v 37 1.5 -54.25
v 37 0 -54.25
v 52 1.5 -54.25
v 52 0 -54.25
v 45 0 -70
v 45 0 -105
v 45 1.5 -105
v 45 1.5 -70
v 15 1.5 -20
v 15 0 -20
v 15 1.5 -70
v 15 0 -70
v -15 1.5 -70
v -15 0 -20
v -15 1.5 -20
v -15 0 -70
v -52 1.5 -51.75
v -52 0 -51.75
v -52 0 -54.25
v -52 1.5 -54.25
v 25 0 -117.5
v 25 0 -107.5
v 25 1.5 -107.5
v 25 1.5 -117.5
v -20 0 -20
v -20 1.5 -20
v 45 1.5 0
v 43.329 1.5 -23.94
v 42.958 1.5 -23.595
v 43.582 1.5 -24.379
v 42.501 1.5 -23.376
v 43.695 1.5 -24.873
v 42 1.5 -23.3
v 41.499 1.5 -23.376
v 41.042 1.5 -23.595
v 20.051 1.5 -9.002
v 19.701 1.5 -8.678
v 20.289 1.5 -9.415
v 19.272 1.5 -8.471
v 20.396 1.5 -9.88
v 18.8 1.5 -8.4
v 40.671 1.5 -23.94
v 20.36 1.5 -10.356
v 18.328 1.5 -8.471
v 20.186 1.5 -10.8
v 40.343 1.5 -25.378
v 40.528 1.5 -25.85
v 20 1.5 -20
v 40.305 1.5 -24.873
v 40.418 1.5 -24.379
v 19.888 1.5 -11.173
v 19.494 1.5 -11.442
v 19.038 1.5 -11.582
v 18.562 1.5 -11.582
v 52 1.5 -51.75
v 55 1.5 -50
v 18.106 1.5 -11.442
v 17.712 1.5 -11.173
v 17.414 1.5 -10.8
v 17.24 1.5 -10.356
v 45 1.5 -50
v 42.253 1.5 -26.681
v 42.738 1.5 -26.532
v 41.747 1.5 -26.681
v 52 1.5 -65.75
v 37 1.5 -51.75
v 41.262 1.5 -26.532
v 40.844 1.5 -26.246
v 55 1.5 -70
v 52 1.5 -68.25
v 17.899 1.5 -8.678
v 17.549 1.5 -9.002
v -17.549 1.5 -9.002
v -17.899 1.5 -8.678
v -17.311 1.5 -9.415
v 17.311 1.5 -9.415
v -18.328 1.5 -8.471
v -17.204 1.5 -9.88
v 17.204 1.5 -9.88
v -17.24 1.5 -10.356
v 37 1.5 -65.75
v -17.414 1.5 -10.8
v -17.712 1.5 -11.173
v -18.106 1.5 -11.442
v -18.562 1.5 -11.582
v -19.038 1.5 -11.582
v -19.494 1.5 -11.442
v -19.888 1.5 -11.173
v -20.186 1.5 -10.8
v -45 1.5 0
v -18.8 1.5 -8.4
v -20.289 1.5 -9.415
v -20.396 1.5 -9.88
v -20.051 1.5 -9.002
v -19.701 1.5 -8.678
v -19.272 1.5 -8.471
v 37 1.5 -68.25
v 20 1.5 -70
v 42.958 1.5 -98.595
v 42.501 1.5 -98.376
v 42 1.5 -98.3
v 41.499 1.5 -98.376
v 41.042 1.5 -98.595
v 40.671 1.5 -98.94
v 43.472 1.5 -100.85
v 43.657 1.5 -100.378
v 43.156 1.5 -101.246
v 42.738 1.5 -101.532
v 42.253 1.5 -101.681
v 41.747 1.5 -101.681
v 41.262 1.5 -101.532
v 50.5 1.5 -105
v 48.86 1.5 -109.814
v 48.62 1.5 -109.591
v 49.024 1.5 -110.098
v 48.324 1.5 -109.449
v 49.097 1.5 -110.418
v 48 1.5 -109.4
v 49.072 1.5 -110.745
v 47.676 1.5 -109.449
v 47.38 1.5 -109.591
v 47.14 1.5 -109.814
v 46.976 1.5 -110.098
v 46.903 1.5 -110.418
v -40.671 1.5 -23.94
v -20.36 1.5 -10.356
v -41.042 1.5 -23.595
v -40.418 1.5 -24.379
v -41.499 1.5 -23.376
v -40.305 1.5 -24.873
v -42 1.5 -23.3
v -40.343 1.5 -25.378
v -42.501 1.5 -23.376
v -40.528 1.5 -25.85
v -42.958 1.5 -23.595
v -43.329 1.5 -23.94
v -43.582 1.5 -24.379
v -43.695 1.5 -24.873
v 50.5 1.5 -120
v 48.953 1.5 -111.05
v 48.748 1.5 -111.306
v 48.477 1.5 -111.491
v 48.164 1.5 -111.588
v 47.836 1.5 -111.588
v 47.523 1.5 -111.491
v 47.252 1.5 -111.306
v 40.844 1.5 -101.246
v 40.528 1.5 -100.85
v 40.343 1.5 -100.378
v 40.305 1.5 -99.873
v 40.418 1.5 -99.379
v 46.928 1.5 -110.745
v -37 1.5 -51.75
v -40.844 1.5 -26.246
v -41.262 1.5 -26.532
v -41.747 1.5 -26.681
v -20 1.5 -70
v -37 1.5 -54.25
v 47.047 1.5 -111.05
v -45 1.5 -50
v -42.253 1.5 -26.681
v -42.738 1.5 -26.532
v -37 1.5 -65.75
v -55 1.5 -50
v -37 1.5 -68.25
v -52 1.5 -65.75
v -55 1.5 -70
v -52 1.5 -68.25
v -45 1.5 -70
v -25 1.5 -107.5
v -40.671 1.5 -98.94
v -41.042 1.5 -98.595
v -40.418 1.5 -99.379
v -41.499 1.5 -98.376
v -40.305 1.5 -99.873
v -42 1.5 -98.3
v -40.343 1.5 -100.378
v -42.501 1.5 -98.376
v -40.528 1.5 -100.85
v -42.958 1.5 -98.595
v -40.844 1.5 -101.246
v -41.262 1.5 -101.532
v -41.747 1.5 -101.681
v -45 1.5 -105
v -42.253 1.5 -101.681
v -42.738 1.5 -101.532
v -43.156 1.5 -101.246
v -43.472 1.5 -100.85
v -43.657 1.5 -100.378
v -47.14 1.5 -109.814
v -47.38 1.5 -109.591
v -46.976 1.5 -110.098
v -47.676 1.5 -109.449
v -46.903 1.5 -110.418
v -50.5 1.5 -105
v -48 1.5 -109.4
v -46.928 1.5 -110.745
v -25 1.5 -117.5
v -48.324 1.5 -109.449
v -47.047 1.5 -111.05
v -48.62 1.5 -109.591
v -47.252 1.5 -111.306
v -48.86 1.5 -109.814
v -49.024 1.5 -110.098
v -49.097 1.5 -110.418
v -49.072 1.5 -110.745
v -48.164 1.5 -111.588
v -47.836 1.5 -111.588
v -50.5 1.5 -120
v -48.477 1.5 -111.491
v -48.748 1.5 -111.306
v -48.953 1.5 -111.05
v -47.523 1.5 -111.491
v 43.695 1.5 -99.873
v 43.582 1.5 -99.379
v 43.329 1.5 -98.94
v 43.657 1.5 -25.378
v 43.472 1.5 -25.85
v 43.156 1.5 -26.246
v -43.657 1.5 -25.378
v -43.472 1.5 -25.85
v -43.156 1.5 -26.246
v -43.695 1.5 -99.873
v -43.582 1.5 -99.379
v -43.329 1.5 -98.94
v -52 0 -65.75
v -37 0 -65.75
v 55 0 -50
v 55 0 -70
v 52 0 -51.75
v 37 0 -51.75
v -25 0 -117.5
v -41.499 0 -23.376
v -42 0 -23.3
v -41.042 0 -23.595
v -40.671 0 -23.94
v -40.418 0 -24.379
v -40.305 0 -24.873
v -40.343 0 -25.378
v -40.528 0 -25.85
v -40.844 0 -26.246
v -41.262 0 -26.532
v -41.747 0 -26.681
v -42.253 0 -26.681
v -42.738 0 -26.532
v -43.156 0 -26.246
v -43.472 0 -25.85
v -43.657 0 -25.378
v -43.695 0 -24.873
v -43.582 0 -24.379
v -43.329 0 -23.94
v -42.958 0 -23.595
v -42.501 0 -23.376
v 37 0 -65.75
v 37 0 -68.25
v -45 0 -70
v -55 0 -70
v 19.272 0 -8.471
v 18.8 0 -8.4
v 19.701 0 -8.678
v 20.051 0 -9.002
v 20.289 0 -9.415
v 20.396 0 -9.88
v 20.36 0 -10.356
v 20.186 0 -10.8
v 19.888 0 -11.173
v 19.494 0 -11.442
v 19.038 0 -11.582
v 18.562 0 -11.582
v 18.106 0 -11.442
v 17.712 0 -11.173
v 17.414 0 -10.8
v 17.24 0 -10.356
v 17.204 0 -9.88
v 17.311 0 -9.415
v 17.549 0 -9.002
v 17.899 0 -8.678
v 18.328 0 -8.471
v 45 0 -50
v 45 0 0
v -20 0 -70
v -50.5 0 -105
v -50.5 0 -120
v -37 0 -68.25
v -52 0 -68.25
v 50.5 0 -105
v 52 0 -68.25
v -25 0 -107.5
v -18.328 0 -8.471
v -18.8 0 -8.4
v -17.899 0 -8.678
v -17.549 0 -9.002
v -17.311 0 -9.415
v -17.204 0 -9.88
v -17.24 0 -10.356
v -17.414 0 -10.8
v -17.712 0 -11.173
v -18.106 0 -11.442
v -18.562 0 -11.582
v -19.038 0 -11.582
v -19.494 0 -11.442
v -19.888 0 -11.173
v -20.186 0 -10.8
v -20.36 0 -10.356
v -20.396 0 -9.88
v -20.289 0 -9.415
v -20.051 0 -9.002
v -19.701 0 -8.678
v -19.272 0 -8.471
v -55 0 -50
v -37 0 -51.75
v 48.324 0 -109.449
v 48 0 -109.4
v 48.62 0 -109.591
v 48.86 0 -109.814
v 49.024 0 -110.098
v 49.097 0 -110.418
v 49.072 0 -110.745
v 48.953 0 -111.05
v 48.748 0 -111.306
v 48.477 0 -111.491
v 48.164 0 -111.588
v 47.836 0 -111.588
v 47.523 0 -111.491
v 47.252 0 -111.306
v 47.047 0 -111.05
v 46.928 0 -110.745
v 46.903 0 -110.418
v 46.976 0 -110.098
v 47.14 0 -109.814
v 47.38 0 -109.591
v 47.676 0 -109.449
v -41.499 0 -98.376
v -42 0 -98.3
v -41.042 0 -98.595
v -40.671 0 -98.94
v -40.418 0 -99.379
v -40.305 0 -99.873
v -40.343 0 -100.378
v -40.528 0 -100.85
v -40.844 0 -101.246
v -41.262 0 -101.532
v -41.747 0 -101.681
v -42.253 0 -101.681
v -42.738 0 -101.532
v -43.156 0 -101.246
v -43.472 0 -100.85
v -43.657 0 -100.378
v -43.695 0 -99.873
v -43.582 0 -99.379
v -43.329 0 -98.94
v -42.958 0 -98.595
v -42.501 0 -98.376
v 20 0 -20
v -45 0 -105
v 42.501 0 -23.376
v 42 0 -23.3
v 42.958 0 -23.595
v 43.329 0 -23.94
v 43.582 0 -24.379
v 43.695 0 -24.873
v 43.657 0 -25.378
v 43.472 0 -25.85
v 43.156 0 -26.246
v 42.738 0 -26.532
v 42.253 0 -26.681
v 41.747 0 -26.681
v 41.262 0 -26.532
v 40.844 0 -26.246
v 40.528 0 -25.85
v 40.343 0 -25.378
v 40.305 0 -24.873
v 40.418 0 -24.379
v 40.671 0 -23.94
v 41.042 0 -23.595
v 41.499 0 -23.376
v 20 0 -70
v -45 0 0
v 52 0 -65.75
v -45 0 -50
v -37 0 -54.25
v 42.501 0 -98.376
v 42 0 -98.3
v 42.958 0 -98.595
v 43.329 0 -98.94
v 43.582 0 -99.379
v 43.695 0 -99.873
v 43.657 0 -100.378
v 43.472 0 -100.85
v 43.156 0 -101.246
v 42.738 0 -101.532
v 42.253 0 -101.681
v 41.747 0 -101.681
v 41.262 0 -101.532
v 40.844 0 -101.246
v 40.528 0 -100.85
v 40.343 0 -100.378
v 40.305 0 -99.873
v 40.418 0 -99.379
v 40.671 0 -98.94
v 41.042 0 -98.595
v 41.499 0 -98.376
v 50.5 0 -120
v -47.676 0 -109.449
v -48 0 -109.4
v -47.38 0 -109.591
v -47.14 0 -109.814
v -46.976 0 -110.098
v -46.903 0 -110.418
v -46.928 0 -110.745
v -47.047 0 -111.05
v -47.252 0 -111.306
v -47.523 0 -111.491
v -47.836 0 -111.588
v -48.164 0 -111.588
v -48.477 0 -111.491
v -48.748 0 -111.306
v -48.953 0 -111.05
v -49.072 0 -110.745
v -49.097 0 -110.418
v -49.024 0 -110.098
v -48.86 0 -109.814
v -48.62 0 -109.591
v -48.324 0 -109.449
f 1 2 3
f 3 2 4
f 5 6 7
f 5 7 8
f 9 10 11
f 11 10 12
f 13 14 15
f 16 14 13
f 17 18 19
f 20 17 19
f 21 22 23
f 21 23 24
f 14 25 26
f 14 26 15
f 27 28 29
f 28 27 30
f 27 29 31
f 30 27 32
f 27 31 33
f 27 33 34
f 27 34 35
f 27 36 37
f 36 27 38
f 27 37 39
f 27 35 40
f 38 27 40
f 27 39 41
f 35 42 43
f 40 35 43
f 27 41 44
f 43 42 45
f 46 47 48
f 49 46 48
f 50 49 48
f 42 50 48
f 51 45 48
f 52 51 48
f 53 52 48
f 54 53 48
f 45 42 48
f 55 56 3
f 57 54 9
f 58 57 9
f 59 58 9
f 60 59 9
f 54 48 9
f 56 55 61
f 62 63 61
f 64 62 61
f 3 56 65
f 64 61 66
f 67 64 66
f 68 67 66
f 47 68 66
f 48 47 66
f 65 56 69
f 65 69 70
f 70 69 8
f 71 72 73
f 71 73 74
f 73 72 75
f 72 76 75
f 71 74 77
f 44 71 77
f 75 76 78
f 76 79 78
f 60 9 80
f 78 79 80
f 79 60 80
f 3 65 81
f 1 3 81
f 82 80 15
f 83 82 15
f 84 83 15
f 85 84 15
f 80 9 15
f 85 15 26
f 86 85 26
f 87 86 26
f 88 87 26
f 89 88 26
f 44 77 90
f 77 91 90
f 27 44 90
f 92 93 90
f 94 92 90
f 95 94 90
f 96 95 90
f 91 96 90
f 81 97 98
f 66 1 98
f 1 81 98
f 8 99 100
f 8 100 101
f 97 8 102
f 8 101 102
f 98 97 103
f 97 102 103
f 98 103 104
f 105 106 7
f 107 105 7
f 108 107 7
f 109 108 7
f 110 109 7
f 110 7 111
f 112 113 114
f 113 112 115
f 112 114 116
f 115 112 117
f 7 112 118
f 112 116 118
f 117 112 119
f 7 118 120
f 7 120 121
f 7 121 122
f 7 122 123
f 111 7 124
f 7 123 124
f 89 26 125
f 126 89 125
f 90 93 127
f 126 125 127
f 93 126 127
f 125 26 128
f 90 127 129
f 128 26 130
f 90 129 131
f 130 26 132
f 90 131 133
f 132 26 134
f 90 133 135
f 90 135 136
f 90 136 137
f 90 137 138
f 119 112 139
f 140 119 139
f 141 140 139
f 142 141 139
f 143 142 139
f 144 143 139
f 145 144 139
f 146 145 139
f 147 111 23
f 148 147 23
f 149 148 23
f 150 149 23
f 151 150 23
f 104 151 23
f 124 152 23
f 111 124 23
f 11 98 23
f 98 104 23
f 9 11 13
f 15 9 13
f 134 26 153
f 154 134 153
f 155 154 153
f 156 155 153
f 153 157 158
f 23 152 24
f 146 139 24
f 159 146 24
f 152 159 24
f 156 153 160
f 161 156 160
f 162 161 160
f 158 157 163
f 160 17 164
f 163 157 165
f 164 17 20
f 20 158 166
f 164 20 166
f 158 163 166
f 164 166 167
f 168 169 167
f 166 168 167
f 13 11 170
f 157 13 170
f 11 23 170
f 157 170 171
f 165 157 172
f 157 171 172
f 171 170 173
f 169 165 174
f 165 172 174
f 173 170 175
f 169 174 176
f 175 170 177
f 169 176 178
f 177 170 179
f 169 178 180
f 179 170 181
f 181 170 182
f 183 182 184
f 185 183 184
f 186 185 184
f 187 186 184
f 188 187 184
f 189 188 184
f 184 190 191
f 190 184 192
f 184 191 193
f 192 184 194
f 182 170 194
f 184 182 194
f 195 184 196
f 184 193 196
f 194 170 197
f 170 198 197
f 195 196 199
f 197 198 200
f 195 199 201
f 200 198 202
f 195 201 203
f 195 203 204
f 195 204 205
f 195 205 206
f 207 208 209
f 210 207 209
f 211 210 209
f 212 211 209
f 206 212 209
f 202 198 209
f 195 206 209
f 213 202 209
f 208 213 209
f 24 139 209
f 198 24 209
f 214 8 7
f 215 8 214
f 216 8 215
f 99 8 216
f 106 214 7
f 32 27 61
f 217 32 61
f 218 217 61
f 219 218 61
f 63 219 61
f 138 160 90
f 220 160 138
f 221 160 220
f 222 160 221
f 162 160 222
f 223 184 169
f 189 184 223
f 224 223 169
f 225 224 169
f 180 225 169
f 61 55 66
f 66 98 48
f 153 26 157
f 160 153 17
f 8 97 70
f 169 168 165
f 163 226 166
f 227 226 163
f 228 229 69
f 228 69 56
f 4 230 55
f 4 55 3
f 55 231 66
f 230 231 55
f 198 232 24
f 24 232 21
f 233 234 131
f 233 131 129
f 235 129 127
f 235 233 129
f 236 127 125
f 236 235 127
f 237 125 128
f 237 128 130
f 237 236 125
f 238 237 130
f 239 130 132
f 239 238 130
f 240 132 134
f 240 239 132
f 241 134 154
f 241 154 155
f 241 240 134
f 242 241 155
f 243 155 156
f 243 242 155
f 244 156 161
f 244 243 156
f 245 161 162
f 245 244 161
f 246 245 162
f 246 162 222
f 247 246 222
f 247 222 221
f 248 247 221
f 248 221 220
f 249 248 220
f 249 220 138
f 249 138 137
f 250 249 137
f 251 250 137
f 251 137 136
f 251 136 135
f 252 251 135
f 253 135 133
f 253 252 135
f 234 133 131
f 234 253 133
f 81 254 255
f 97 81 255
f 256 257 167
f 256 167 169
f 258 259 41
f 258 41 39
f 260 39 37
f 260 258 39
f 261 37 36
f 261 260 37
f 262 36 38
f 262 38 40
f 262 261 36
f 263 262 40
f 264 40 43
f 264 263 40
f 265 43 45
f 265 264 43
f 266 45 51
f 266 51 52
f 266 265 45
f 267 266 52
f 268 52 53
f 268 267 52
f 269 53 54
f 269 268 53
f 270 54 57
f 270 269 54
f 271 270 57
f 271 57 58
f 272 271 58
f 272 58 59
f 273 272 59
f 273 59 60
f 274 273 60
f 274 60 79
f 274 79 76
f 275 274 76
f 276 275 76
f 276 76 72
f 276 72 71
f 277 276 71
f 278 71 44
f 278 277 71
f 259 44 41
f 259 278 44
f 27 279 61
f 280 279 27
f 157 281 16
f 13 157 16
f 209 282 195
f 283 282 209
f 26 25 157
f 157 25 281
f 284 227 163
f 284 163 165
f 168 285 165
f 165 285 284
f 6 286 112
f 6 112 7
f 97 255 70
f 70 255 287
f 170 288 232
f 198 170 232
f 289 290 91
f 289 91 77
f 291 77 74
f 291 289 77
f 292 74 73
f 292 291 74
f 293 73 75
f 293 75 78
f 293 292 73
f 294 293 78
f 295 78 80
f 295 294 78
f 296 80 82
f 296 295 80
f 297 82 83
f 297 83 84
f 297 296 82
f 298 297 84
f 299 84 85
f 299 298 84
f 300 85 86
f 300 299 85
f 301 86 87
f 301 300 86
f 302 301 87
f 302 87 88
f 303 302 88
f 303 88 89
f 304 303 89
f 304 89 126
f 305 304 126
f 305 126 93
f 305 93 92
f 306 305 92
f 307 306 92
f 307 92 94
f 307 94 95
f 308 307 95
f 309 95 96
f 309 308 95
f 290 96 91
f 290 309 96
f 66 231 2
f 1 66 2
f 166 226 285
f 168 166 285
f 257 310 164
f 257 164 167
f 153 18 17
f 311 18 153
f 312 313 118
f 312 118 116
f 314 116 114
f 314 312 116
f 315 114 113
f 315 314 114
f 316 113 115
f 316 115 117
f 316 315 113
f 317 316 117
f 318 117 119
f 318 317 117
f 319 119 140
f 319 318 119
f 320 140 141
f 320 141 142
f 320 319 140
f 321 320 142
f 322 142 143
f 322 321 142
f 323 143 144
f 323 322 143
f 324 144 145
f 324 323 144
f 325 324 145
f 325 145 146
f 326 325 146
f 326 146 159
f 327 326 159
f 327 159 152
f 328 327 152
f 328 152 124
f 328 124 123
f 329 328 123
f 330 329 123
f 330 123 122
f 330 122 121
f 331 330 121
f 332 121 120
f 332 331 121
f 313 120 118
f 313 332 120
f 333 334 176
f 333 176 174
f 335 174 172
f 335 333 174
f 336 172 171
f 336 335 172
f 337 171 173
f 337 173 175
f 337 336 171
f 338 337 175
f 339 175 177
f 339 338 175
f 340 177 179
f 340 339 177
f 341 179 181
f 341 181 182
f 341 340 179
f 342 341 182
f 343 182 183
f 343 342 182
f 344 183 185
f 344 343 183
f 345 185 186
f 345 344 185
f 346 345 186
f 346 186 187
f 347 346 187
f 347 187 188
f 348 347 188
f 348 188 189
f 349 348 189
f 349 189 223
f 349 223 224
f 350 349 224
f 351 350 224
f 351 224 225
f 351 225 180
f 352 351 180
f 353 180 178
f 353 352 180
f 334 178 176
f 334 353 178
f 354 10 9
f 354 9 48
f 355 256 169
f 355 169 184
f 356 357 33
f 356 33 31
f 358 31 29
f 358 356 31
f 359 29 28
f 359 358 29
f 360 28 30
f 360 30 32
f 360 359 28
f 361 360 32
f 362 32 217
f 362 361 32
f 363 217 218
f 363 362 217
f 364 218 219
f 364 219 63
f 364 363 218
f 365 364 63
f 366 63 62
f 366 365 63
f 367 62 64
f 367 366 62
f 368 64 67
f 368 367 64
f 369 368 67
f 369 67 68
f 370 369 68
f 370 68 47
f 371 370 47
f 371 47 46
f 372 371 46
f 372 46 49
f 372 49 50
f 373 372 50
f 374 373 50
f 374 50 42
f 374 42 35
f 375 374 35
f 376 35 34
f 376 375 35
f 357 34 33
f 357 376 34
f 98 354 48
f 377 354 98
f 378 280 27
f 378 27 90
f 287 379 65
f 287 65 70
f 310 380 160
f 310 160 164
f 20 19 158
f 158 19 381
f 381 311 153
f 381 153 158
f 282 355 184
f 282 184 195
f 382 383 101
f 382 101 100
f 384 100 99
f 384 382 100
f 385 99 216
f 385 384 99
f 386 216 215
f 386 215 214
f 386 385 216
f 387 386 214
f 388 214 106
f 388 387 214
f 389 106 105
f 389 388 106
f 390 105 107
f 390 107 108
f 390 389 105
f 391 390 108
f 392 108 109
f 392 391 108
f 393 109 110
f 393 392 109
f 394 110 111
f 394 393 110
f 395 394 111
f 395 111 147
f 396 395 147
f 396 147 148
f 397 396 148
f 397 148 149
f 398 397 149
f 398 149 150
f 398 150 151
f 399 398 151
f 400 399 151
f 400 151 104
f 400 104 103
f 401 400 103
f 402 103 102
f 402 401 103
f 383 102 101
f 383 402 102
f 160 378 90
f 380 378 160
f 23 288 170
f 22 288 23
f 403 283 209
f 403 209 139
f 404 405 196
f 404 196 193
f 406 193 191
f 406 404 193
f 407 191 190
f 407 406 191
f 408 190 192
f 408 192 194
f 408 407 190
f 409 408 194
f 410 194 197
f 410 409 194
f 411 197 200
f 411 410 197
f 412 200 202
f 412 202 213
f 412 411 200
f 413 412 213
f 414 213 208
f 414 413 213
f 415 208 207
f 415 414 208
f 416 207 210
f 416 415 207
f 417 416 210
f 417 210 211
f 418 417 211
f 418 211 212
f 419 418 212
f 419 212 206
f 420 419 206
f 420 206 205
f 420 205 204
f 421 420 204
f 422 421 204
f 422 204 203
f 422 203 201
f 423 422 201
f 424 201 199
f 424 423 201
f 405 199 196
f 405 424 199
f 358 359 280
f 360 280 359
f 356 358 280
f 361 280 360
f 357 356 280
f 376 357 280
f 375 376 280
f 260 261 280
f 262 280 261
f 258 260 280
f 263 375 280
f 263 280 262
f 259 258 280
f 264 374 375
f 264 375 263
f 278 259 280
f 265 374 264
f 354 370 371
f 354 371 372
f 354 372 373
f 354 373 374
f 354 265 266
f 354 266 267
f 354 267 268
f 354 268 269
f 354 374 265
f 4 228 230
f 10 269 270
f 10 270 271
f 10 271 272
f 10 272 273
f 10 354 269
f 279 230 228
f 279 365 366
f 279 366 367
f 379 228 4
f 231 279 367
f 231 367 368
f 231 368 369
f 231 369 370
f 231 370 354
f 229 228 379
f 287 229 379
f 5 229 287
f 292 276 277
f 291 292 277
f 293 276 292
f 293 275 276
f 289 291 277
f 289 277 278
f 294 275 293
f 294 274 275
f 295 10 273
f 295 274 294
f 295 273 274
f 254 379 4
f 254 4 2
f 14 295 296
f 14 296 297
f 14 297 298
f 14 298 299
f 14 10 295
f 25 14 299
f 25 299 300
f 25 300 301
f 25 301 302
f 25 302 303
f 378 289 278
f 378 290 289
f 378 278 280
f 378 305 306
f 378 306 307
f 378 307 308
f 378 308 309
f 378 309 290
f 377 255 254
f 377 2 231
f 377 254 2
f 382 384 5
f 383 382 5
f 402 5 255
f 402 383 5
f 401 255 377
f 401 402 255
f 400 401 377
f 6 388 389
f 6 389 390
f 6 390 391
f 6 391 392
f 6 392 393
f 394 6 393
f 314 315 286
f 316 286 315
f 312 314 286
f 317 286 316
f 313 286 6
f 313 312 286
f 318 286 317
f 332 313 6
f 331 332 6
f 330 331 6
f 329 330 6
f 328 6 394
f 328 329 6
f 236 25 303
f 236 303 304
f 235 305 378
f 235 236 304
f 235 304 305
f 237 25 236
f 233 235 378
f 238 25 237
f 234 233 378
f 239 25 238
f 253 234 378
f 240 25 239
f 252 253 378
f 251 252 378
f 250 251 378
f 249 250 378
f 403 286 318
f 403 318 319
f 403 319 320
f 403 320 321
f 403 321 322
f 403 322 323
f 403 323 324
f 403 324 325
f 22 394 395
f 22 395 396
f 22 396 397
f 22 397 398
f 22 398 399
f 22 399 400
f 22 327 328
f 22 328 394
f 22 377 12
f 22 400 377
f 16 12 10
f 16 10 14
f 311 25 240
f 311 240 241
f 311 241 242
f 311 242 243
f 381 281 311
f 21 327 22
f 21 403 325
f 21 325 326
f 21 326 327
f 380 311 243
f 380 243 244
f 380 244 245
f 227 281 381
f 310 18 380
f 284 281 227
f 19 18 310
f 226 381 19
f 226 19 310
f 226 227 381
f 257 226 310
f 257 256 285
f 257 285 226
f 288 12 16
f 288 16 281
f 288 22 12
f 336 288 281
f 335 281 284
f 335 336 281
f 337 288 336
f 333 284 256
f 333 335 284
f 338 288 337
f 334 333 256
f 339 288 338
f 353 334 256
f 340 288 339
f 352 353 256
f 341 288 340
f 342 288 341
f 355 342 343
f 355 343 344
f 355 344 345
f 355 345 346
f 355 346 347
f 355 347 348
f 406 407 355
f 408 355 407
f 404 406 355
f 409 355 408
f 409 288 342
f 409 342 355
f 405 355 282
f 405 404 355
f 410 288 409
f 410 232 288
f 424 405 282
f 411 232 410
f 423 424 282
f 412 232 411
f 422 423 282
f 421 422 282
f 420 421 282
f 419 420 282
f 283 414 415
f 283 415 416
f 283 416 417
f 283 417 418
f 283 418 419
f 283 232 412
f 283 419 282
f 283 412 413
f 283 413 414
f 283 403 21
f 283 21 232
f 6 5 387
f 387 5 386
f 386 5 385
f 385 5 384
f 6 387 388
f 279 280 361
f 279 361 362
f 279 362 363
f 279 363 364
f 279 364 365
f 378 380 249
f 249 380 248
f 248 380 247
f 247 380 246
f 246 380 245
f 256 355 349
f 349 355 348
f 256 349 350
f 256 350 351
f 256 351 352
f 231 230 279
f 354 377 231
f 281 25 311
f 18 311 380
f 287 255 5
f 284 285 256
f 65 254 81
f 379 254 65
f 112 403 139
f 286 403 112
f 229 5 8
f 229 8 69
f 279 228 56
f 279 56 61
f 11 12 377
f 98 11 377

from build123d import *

# Parameters (mm, degrees)
SKETCH1_R           = 1.1
SKETCH1_R_2         = 1.7
SKETCH1_R_3         = 1.6
SKETCH1_W           = 50
SKETCH1_H           = 10
SKETCH1_W_2         = 15
SKETCH1_H_2         = 2.5
SKETCH1_W_3         = 5
SKETCH1_H_3         = 50
BOSS_EXTRUDE1_DEPTH = 1.5


with BuildPart() as part:
    # Sketch1 → Boss-Extrude1 (new body)
    with BuildSketch(Plane(origin=(0, 0, 0), x_dir=(1, 0, 0), z_dir=(0, 1, 0))):
        Polygon((-45, 105), (-50.5, 105), (-50.5, 120), (50.5, 120), (50.5, 105), (45, 105), (45, 70), (55, 70), (55, 50), (45, 50), (45, 0), (-45, 0), (-45, 50), (-55, 50), (-55, 70), (-45, 70), align=None)
        with Locations(Location((48, 110.5, 0), (0, 0, 270))):
            Circle(SKETCH1_R, mode=Mode.SUBTRACT)
        with Locations(Location((-48, 110.5, 0), (0, 0, 270))):
            Circle(SKETCH1_R, mode=Mode.SUBTRACT)
        with Locations(Location((42, 100, 0), (0, 0, 270))):
            Circle(SKETCH1_R_2, mode=Mode.SUBTRACT)
        with Locations(Location((-42, 100, 0), (0, 0, 270))):
            Circle(SKETCH1_R_2, mode=Mode.SUBTRACT)
        with Locations(Location((-42, 25, 0), (0, 0, 270))):
            Circle(SKETCH1_R_2, mode=Mode.SUBTRACT)
        with Locations(Location((42, 25, 0), (0, 0, 270))):
            Circle(SKETCH1_R_2, mode=Mode.SUBTRACT)
        with Locations(Location((-18.8, 10, 0), (0, 0, 270))):
            Circle(SKETCH1_R_3, mode=Mode.SUBTRACT)
        with Locations(Location((18.8, 10, 0), (0, 0, 270))):
            Circle(SKETCH1_R_3, mode=Mode.SUBTRACT)
        with Locations((0, 112.5)):
            Rectangle(SKETCH1_W, SKETCH1_H, mode=Mode.SUBTRACT)
        with Locations((-44.5, 67)):
            Rectangle(SKETCH1_W_2, SKETCH1_H_2, mode=Mode.SUBTRACT)
        with Locations((-44.5, 53)):
            Rectangle(SKETCH1_W_2, SKETCH1_H_2, mode=Mode.SUBTRACT)
        with Locations((44.5, 53)):
            Rectangle(SKETCH1_W_2, SKETCH1_H_2, mode=Mode.SUBTRACT)
        with Locations((17.5, 45)):
            Rectangle(SKETCH1_W_3, SKETCH1_H_3, mode=Mode.SUBTRACT)
        with Locations((-17.5, 45)):
            Rectangle(SKETCH1_W_3, SKETCH1_H_3, mode=Mode.SUBTRACT)
        with Locations((44.5, 67)):
            Rectangle(SKETCH1_W_2, SKETCH1_H_2, mode=Mode.SUBTRACT)
    extrude(amount=BOSS_EXTRUDE1_DEPTH)


solid = part.part
